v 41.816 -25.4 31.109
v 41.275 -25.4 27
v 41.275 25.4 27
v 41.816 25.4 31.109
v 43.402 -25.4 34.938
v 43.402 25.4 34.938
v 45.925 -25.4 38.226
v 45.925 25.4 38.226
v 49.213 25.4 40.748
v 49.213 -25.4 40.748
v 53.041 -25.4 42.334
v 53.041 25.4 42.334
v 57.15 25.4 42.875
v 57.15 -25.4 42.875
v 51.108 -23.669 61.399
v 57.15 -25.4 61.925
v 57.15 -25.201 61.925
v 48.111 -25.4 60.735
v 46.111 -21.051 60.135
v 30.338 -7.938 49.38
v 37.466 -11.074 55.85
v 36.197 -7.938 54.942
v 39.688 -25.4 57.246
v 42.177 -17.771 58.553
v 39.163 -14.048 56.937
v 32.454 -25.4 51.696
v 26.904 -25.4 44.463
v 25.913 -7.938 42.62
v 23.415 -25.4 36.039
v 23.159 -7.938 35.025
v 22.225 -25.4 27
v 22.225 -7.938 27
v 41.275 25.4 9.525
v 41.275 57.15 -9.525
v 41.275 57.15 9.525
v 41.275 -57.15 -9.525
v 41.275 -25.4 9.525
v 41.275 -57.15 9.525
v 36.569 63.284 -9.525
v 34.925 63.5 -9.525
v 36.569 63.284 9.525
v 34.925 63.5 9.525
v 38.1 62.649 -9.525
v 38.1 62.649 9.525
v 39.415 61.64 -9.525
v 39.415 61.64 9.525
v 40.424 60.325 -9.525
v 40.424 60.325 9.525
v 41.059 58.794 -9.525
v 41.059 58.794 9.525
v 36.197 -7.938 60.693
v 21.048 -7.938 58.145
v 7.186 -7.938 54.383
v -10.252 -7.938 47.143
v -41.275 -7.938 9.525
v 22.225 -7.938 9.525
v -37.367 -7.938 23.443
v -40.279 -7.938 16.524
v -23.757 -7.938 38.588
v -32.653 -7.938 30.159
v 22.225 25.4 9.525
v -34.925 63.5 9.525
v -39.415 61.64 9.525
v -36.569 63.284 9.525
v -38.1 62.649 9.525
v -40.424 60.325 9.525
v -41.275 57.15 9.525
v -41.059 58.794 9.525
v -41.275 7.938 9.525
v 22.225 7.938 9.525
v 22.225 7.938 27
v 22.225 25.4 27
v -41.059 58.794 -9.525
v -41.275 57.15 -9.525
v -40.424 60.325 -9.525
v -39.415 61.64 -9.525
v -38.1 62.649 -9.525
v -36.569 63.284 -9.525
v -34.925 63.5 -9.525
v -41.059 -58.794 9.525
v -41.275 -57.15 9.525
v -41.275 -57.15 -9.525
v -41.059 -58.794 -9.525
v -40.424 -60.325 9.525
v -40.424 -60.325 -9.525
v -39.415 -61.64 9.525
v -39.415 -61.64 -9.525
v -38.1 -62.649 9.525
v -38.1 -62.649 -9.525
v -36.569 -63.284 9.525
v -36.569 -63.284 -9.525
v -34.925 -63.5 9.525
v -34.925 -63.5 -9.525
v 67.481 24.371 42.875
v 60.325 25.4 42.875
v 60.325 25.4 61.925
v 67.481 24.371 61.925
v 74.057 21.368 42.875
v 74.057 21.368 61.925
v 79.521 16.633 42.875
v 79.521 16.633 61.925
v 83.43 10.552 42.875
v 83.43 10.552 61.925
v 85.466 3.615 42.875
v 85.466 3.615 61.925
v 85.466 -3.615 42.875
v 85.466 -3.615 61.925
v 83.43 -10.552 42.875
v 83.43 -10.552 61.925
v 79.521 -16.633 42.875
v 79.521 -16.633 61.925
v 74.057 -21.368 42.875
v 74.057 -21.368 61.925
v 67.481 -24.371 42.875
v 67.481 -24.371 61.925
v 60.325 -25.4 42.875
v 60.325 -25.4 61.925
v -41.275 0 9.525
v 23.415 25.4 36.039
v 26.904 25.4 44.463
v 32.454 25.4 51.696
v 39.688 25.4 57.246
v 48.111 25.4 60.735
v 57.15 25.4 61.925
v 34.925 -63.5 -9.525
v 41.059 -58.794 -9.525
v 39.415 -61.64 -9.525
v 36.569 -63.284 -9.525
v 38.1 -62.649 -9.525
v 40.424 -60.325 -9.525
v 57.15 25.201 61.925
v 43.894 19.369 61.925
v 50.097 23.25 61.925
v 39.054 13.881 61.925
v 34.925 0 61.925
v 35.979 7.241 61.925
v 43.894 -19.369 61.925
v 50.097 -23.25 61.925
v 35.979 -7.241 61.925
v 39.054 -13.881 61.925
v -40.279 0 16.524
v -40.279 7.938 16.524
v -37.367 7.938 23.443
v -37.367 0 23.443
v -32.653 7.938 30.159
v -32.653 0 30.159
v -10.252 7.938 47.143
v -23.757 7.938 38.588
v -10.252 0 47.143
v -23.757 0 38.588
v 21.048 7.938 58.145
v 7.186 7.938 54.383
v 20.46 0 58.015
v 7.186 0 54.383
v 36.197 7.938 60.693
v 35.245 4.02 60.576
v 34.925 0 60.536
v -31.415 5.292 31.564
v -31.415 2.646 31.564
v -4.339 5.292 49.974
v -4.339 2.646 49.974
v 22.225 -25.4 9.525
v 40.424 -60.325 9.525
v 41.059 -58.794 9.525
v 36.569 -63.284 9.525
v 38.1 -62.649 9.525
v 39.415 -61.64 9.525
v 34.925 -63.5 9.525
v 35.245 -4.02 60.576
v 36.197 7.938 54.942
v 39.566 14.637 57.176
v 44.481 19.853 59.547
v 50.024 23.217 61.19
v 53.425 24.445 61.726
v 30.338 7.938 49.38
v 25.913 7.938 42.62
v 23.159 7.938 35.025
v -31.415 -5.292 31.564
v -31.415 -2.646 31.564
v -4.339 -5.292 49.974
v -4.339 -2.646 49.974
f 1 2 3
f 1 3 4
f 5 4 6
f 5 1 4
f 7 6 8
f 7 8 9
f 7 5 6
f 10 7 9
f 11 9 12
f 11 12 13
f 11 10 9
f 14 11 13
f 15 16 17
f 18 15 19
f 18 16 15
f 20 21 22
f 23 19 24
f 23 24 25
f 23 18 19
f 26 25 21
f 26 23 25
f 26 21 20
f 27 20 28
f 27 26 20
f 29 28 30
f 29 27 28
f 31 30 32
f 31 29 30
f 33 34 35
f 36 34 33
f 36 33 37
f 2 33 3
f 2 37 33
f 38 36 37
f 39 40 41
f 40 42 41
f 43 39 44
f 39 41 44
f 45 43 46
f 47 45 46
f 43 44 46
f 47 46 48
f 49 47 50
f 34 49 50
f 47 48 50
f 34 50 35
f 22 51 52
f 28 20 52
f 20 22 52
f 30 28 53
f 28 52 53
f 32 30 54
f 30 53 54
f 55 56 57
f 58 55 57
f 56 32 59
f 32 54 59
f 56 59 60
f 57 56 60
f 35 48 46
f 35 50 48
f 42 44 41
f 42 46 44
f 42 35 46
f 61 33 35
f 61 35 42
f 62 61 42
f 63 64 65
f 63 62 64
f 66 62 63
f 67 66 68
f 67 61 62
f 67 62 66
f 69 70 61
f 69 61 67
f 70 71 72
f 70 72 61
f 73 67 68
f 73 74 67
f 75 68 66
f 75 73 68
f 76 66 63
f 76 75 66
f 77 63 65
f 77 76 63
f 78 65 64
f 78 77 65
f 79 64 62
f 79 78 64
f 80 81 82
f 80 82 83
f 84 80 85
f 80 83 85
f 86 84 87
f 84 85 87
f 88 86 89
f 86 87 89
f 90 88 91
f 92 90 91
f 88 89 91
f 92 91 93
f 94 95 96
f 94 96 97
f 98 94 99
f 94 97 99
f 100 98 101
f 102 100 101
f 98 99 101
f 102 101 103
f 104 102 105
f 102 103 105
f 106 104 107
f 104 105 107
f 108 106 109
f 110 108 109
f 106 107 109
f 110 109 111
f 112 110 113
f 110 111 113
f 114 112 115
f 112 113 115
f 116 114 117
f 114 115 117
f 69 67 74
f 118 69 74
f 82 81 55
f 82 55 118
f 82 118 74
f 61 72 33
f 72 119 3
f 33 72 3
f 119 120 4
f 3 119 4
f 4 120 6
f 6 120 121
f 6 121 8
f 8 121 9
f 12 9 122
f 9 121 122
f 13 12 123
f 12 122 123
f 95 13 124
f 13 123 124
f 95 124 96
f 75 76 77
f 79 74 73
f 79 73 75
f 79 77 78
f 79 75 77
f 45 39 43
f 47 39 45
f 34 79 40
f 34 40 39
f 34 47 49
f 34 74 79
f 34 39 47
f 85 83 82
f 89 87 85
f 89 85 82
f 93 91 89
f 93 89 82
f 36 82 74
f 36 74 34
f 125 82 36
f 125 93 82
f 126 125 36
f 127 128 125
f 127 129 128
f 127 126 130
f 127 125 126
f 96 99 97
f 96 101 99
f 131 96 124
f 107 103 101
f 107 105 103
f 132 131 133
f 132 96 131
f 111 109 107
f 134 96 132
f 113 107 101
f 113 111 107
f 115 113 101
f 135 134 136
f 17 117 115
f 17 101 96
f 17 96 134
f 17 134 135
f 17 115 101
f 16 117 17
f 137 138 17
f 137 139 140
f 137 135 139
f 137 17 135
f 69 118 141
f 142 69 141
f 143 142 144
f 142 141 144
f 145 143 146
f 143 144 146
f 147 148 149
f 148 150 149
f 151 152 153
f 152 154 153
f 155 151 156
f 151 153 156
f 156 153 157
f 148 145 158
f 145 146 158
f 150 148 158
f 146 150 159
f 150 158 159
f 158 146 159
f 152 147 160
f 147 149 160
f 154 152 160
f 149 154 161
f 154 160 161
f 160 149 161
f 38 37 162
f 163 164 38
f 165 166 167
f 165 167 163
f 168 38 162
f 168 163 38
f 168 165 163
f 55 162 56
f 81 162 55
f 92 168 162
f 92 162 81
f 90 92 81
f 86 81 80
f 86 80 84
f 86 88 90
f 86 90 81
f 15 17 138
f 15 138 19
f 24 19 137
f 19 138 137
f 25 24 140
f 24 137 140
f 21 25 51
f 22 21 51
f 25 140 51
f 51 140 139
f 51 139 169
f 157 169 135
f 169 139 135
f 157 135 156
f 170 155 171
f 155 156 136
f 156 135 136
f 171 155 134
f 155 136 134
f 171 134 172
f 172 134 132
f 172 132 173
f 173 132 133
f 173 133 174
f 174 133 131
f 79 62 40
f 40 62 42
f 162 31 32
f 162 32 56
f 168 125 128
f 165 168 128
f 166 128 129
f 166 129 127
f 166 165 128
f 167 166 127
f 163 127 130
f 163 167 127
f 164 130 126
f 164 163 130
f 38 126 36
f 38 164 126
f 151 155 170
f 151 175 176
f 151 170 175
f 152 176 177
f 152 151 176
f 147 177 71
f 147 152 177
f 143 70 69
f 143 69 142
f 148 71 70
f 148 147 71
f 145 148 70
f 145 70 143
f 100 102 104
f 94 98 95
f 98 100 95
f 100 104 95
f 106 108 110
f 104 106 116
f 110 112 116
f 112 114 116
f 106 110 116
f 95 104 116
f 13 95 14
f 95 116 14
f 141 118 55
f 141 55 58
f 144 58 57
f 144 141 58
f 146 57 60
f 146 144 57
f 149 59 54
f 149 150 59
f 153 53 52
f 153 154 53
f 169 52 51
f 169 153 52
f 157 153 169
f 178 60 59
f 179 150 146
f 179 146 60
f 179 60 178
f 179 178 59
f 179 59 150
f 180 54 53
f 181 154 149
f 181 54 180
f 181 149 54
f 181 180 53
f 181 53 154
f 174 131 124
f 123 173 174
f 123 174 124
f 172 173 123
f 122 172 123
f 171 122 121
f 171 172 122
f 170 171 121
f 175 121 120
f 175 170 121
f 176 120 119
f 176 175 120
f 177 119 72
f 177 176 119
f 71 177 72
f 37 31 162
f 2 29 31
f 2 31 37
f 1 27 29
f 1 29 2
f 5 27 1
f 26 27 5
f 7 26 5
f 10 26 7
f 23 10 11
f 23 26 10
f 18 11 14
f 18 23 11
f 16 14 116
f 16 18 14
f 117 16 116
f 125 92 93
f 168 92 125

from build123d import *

# Parameters (mm, degrees)
F1_DEPTH = 63.5
F2_DEPTH = 25.4
F3_DEPTH = 7.9375
F0_W     = 25.4
F0_H     = 19.05
F5_R     = 6.35


with BuildPart() as f1:
    # F0 (on Front) → F1 (new body, symmetric)
    with BuildSketch(Plane.XZ):
        Polygon((-41.275, 9.525), (-41.275, -9.525), (41.275, -9.525), (41.275, 9.525), (22.225, 9.525), align=None)
    extrude(amount=F1_DEPTH, both=True)

    # F0 (on Front) → F2 (join, symmetric)
    with BuildSketch(Plane.XZ):
        with BuildLine():
            Line((22.225, 9.525), (41.275, 9.525))
            Line((41.275, 9.525), (41.275, 27.0002))
            ThreePointArc((41.275, 27.0002), (45.9246798487, 38.2255201513), (57.15, 42.8752))
            Line((57.15, 42.8752), (60.325, 42.8752))
            Line((60.325, 42.8752), (60.325, 61.9252))
            Line((60.325, 61.9252), (57.15, 61.9252))
            ThreePointArc((57.15, 61.9252), (32.4542956671, 51.6959043329), (22.225, 27.0002))
            Line((22.225, 27.0002), (22.225, 9.525))
        make_face()
    extrude(amount=F2_DEPTH, both=True)

    # F0 (on Front) → F3 (join, symmetric)
    with BuildSketch(Plane.XZ):
        with BuildLine():
            add(Edge.make_bspline(
                [(-41.275, 9.525), (-41.275, 35.2953113616), (0, 61.9252), (57.15, 61.9252)],
                knots=[0, 0, 0, 0, 111.5045361635, 111.5045361635, 111.5045361635, 111.5045361635], degree=3))
            Line((-41.275, 9.525), (22.225, 9.525))
            Line((22.225, 9.525), (22.225, 27.0002))
            ThreePointArc((22.225, 27.0002), (32.4542956671, 51.6959043329), (57.15, 61.9252))
        make_face()
    extrude(amount=F3_DEPTH, both=True)

    # F0 (on Front) → F4 (revolve)
    with BuildSketch(Plane.XZ):
        with Locations((73.025, 52.4002)):
            Rectangle(F0_W, F0_H)
    revolve(axis=Axis((60.325, 0, 52.3875), (0, 0, -1)))

    # F5
    f5_edges = [f1.edges().sort_by_distance(p)[0] for p in [
        (-41.275, -63.5, 0),
        (41.275, -63.5, 0),
        (41.275, 63.5, 0),
        (-41.275, 63.5, 0),
    ]]
    fillet(f5_edges, radius=F5_R)


solid = f1.part
